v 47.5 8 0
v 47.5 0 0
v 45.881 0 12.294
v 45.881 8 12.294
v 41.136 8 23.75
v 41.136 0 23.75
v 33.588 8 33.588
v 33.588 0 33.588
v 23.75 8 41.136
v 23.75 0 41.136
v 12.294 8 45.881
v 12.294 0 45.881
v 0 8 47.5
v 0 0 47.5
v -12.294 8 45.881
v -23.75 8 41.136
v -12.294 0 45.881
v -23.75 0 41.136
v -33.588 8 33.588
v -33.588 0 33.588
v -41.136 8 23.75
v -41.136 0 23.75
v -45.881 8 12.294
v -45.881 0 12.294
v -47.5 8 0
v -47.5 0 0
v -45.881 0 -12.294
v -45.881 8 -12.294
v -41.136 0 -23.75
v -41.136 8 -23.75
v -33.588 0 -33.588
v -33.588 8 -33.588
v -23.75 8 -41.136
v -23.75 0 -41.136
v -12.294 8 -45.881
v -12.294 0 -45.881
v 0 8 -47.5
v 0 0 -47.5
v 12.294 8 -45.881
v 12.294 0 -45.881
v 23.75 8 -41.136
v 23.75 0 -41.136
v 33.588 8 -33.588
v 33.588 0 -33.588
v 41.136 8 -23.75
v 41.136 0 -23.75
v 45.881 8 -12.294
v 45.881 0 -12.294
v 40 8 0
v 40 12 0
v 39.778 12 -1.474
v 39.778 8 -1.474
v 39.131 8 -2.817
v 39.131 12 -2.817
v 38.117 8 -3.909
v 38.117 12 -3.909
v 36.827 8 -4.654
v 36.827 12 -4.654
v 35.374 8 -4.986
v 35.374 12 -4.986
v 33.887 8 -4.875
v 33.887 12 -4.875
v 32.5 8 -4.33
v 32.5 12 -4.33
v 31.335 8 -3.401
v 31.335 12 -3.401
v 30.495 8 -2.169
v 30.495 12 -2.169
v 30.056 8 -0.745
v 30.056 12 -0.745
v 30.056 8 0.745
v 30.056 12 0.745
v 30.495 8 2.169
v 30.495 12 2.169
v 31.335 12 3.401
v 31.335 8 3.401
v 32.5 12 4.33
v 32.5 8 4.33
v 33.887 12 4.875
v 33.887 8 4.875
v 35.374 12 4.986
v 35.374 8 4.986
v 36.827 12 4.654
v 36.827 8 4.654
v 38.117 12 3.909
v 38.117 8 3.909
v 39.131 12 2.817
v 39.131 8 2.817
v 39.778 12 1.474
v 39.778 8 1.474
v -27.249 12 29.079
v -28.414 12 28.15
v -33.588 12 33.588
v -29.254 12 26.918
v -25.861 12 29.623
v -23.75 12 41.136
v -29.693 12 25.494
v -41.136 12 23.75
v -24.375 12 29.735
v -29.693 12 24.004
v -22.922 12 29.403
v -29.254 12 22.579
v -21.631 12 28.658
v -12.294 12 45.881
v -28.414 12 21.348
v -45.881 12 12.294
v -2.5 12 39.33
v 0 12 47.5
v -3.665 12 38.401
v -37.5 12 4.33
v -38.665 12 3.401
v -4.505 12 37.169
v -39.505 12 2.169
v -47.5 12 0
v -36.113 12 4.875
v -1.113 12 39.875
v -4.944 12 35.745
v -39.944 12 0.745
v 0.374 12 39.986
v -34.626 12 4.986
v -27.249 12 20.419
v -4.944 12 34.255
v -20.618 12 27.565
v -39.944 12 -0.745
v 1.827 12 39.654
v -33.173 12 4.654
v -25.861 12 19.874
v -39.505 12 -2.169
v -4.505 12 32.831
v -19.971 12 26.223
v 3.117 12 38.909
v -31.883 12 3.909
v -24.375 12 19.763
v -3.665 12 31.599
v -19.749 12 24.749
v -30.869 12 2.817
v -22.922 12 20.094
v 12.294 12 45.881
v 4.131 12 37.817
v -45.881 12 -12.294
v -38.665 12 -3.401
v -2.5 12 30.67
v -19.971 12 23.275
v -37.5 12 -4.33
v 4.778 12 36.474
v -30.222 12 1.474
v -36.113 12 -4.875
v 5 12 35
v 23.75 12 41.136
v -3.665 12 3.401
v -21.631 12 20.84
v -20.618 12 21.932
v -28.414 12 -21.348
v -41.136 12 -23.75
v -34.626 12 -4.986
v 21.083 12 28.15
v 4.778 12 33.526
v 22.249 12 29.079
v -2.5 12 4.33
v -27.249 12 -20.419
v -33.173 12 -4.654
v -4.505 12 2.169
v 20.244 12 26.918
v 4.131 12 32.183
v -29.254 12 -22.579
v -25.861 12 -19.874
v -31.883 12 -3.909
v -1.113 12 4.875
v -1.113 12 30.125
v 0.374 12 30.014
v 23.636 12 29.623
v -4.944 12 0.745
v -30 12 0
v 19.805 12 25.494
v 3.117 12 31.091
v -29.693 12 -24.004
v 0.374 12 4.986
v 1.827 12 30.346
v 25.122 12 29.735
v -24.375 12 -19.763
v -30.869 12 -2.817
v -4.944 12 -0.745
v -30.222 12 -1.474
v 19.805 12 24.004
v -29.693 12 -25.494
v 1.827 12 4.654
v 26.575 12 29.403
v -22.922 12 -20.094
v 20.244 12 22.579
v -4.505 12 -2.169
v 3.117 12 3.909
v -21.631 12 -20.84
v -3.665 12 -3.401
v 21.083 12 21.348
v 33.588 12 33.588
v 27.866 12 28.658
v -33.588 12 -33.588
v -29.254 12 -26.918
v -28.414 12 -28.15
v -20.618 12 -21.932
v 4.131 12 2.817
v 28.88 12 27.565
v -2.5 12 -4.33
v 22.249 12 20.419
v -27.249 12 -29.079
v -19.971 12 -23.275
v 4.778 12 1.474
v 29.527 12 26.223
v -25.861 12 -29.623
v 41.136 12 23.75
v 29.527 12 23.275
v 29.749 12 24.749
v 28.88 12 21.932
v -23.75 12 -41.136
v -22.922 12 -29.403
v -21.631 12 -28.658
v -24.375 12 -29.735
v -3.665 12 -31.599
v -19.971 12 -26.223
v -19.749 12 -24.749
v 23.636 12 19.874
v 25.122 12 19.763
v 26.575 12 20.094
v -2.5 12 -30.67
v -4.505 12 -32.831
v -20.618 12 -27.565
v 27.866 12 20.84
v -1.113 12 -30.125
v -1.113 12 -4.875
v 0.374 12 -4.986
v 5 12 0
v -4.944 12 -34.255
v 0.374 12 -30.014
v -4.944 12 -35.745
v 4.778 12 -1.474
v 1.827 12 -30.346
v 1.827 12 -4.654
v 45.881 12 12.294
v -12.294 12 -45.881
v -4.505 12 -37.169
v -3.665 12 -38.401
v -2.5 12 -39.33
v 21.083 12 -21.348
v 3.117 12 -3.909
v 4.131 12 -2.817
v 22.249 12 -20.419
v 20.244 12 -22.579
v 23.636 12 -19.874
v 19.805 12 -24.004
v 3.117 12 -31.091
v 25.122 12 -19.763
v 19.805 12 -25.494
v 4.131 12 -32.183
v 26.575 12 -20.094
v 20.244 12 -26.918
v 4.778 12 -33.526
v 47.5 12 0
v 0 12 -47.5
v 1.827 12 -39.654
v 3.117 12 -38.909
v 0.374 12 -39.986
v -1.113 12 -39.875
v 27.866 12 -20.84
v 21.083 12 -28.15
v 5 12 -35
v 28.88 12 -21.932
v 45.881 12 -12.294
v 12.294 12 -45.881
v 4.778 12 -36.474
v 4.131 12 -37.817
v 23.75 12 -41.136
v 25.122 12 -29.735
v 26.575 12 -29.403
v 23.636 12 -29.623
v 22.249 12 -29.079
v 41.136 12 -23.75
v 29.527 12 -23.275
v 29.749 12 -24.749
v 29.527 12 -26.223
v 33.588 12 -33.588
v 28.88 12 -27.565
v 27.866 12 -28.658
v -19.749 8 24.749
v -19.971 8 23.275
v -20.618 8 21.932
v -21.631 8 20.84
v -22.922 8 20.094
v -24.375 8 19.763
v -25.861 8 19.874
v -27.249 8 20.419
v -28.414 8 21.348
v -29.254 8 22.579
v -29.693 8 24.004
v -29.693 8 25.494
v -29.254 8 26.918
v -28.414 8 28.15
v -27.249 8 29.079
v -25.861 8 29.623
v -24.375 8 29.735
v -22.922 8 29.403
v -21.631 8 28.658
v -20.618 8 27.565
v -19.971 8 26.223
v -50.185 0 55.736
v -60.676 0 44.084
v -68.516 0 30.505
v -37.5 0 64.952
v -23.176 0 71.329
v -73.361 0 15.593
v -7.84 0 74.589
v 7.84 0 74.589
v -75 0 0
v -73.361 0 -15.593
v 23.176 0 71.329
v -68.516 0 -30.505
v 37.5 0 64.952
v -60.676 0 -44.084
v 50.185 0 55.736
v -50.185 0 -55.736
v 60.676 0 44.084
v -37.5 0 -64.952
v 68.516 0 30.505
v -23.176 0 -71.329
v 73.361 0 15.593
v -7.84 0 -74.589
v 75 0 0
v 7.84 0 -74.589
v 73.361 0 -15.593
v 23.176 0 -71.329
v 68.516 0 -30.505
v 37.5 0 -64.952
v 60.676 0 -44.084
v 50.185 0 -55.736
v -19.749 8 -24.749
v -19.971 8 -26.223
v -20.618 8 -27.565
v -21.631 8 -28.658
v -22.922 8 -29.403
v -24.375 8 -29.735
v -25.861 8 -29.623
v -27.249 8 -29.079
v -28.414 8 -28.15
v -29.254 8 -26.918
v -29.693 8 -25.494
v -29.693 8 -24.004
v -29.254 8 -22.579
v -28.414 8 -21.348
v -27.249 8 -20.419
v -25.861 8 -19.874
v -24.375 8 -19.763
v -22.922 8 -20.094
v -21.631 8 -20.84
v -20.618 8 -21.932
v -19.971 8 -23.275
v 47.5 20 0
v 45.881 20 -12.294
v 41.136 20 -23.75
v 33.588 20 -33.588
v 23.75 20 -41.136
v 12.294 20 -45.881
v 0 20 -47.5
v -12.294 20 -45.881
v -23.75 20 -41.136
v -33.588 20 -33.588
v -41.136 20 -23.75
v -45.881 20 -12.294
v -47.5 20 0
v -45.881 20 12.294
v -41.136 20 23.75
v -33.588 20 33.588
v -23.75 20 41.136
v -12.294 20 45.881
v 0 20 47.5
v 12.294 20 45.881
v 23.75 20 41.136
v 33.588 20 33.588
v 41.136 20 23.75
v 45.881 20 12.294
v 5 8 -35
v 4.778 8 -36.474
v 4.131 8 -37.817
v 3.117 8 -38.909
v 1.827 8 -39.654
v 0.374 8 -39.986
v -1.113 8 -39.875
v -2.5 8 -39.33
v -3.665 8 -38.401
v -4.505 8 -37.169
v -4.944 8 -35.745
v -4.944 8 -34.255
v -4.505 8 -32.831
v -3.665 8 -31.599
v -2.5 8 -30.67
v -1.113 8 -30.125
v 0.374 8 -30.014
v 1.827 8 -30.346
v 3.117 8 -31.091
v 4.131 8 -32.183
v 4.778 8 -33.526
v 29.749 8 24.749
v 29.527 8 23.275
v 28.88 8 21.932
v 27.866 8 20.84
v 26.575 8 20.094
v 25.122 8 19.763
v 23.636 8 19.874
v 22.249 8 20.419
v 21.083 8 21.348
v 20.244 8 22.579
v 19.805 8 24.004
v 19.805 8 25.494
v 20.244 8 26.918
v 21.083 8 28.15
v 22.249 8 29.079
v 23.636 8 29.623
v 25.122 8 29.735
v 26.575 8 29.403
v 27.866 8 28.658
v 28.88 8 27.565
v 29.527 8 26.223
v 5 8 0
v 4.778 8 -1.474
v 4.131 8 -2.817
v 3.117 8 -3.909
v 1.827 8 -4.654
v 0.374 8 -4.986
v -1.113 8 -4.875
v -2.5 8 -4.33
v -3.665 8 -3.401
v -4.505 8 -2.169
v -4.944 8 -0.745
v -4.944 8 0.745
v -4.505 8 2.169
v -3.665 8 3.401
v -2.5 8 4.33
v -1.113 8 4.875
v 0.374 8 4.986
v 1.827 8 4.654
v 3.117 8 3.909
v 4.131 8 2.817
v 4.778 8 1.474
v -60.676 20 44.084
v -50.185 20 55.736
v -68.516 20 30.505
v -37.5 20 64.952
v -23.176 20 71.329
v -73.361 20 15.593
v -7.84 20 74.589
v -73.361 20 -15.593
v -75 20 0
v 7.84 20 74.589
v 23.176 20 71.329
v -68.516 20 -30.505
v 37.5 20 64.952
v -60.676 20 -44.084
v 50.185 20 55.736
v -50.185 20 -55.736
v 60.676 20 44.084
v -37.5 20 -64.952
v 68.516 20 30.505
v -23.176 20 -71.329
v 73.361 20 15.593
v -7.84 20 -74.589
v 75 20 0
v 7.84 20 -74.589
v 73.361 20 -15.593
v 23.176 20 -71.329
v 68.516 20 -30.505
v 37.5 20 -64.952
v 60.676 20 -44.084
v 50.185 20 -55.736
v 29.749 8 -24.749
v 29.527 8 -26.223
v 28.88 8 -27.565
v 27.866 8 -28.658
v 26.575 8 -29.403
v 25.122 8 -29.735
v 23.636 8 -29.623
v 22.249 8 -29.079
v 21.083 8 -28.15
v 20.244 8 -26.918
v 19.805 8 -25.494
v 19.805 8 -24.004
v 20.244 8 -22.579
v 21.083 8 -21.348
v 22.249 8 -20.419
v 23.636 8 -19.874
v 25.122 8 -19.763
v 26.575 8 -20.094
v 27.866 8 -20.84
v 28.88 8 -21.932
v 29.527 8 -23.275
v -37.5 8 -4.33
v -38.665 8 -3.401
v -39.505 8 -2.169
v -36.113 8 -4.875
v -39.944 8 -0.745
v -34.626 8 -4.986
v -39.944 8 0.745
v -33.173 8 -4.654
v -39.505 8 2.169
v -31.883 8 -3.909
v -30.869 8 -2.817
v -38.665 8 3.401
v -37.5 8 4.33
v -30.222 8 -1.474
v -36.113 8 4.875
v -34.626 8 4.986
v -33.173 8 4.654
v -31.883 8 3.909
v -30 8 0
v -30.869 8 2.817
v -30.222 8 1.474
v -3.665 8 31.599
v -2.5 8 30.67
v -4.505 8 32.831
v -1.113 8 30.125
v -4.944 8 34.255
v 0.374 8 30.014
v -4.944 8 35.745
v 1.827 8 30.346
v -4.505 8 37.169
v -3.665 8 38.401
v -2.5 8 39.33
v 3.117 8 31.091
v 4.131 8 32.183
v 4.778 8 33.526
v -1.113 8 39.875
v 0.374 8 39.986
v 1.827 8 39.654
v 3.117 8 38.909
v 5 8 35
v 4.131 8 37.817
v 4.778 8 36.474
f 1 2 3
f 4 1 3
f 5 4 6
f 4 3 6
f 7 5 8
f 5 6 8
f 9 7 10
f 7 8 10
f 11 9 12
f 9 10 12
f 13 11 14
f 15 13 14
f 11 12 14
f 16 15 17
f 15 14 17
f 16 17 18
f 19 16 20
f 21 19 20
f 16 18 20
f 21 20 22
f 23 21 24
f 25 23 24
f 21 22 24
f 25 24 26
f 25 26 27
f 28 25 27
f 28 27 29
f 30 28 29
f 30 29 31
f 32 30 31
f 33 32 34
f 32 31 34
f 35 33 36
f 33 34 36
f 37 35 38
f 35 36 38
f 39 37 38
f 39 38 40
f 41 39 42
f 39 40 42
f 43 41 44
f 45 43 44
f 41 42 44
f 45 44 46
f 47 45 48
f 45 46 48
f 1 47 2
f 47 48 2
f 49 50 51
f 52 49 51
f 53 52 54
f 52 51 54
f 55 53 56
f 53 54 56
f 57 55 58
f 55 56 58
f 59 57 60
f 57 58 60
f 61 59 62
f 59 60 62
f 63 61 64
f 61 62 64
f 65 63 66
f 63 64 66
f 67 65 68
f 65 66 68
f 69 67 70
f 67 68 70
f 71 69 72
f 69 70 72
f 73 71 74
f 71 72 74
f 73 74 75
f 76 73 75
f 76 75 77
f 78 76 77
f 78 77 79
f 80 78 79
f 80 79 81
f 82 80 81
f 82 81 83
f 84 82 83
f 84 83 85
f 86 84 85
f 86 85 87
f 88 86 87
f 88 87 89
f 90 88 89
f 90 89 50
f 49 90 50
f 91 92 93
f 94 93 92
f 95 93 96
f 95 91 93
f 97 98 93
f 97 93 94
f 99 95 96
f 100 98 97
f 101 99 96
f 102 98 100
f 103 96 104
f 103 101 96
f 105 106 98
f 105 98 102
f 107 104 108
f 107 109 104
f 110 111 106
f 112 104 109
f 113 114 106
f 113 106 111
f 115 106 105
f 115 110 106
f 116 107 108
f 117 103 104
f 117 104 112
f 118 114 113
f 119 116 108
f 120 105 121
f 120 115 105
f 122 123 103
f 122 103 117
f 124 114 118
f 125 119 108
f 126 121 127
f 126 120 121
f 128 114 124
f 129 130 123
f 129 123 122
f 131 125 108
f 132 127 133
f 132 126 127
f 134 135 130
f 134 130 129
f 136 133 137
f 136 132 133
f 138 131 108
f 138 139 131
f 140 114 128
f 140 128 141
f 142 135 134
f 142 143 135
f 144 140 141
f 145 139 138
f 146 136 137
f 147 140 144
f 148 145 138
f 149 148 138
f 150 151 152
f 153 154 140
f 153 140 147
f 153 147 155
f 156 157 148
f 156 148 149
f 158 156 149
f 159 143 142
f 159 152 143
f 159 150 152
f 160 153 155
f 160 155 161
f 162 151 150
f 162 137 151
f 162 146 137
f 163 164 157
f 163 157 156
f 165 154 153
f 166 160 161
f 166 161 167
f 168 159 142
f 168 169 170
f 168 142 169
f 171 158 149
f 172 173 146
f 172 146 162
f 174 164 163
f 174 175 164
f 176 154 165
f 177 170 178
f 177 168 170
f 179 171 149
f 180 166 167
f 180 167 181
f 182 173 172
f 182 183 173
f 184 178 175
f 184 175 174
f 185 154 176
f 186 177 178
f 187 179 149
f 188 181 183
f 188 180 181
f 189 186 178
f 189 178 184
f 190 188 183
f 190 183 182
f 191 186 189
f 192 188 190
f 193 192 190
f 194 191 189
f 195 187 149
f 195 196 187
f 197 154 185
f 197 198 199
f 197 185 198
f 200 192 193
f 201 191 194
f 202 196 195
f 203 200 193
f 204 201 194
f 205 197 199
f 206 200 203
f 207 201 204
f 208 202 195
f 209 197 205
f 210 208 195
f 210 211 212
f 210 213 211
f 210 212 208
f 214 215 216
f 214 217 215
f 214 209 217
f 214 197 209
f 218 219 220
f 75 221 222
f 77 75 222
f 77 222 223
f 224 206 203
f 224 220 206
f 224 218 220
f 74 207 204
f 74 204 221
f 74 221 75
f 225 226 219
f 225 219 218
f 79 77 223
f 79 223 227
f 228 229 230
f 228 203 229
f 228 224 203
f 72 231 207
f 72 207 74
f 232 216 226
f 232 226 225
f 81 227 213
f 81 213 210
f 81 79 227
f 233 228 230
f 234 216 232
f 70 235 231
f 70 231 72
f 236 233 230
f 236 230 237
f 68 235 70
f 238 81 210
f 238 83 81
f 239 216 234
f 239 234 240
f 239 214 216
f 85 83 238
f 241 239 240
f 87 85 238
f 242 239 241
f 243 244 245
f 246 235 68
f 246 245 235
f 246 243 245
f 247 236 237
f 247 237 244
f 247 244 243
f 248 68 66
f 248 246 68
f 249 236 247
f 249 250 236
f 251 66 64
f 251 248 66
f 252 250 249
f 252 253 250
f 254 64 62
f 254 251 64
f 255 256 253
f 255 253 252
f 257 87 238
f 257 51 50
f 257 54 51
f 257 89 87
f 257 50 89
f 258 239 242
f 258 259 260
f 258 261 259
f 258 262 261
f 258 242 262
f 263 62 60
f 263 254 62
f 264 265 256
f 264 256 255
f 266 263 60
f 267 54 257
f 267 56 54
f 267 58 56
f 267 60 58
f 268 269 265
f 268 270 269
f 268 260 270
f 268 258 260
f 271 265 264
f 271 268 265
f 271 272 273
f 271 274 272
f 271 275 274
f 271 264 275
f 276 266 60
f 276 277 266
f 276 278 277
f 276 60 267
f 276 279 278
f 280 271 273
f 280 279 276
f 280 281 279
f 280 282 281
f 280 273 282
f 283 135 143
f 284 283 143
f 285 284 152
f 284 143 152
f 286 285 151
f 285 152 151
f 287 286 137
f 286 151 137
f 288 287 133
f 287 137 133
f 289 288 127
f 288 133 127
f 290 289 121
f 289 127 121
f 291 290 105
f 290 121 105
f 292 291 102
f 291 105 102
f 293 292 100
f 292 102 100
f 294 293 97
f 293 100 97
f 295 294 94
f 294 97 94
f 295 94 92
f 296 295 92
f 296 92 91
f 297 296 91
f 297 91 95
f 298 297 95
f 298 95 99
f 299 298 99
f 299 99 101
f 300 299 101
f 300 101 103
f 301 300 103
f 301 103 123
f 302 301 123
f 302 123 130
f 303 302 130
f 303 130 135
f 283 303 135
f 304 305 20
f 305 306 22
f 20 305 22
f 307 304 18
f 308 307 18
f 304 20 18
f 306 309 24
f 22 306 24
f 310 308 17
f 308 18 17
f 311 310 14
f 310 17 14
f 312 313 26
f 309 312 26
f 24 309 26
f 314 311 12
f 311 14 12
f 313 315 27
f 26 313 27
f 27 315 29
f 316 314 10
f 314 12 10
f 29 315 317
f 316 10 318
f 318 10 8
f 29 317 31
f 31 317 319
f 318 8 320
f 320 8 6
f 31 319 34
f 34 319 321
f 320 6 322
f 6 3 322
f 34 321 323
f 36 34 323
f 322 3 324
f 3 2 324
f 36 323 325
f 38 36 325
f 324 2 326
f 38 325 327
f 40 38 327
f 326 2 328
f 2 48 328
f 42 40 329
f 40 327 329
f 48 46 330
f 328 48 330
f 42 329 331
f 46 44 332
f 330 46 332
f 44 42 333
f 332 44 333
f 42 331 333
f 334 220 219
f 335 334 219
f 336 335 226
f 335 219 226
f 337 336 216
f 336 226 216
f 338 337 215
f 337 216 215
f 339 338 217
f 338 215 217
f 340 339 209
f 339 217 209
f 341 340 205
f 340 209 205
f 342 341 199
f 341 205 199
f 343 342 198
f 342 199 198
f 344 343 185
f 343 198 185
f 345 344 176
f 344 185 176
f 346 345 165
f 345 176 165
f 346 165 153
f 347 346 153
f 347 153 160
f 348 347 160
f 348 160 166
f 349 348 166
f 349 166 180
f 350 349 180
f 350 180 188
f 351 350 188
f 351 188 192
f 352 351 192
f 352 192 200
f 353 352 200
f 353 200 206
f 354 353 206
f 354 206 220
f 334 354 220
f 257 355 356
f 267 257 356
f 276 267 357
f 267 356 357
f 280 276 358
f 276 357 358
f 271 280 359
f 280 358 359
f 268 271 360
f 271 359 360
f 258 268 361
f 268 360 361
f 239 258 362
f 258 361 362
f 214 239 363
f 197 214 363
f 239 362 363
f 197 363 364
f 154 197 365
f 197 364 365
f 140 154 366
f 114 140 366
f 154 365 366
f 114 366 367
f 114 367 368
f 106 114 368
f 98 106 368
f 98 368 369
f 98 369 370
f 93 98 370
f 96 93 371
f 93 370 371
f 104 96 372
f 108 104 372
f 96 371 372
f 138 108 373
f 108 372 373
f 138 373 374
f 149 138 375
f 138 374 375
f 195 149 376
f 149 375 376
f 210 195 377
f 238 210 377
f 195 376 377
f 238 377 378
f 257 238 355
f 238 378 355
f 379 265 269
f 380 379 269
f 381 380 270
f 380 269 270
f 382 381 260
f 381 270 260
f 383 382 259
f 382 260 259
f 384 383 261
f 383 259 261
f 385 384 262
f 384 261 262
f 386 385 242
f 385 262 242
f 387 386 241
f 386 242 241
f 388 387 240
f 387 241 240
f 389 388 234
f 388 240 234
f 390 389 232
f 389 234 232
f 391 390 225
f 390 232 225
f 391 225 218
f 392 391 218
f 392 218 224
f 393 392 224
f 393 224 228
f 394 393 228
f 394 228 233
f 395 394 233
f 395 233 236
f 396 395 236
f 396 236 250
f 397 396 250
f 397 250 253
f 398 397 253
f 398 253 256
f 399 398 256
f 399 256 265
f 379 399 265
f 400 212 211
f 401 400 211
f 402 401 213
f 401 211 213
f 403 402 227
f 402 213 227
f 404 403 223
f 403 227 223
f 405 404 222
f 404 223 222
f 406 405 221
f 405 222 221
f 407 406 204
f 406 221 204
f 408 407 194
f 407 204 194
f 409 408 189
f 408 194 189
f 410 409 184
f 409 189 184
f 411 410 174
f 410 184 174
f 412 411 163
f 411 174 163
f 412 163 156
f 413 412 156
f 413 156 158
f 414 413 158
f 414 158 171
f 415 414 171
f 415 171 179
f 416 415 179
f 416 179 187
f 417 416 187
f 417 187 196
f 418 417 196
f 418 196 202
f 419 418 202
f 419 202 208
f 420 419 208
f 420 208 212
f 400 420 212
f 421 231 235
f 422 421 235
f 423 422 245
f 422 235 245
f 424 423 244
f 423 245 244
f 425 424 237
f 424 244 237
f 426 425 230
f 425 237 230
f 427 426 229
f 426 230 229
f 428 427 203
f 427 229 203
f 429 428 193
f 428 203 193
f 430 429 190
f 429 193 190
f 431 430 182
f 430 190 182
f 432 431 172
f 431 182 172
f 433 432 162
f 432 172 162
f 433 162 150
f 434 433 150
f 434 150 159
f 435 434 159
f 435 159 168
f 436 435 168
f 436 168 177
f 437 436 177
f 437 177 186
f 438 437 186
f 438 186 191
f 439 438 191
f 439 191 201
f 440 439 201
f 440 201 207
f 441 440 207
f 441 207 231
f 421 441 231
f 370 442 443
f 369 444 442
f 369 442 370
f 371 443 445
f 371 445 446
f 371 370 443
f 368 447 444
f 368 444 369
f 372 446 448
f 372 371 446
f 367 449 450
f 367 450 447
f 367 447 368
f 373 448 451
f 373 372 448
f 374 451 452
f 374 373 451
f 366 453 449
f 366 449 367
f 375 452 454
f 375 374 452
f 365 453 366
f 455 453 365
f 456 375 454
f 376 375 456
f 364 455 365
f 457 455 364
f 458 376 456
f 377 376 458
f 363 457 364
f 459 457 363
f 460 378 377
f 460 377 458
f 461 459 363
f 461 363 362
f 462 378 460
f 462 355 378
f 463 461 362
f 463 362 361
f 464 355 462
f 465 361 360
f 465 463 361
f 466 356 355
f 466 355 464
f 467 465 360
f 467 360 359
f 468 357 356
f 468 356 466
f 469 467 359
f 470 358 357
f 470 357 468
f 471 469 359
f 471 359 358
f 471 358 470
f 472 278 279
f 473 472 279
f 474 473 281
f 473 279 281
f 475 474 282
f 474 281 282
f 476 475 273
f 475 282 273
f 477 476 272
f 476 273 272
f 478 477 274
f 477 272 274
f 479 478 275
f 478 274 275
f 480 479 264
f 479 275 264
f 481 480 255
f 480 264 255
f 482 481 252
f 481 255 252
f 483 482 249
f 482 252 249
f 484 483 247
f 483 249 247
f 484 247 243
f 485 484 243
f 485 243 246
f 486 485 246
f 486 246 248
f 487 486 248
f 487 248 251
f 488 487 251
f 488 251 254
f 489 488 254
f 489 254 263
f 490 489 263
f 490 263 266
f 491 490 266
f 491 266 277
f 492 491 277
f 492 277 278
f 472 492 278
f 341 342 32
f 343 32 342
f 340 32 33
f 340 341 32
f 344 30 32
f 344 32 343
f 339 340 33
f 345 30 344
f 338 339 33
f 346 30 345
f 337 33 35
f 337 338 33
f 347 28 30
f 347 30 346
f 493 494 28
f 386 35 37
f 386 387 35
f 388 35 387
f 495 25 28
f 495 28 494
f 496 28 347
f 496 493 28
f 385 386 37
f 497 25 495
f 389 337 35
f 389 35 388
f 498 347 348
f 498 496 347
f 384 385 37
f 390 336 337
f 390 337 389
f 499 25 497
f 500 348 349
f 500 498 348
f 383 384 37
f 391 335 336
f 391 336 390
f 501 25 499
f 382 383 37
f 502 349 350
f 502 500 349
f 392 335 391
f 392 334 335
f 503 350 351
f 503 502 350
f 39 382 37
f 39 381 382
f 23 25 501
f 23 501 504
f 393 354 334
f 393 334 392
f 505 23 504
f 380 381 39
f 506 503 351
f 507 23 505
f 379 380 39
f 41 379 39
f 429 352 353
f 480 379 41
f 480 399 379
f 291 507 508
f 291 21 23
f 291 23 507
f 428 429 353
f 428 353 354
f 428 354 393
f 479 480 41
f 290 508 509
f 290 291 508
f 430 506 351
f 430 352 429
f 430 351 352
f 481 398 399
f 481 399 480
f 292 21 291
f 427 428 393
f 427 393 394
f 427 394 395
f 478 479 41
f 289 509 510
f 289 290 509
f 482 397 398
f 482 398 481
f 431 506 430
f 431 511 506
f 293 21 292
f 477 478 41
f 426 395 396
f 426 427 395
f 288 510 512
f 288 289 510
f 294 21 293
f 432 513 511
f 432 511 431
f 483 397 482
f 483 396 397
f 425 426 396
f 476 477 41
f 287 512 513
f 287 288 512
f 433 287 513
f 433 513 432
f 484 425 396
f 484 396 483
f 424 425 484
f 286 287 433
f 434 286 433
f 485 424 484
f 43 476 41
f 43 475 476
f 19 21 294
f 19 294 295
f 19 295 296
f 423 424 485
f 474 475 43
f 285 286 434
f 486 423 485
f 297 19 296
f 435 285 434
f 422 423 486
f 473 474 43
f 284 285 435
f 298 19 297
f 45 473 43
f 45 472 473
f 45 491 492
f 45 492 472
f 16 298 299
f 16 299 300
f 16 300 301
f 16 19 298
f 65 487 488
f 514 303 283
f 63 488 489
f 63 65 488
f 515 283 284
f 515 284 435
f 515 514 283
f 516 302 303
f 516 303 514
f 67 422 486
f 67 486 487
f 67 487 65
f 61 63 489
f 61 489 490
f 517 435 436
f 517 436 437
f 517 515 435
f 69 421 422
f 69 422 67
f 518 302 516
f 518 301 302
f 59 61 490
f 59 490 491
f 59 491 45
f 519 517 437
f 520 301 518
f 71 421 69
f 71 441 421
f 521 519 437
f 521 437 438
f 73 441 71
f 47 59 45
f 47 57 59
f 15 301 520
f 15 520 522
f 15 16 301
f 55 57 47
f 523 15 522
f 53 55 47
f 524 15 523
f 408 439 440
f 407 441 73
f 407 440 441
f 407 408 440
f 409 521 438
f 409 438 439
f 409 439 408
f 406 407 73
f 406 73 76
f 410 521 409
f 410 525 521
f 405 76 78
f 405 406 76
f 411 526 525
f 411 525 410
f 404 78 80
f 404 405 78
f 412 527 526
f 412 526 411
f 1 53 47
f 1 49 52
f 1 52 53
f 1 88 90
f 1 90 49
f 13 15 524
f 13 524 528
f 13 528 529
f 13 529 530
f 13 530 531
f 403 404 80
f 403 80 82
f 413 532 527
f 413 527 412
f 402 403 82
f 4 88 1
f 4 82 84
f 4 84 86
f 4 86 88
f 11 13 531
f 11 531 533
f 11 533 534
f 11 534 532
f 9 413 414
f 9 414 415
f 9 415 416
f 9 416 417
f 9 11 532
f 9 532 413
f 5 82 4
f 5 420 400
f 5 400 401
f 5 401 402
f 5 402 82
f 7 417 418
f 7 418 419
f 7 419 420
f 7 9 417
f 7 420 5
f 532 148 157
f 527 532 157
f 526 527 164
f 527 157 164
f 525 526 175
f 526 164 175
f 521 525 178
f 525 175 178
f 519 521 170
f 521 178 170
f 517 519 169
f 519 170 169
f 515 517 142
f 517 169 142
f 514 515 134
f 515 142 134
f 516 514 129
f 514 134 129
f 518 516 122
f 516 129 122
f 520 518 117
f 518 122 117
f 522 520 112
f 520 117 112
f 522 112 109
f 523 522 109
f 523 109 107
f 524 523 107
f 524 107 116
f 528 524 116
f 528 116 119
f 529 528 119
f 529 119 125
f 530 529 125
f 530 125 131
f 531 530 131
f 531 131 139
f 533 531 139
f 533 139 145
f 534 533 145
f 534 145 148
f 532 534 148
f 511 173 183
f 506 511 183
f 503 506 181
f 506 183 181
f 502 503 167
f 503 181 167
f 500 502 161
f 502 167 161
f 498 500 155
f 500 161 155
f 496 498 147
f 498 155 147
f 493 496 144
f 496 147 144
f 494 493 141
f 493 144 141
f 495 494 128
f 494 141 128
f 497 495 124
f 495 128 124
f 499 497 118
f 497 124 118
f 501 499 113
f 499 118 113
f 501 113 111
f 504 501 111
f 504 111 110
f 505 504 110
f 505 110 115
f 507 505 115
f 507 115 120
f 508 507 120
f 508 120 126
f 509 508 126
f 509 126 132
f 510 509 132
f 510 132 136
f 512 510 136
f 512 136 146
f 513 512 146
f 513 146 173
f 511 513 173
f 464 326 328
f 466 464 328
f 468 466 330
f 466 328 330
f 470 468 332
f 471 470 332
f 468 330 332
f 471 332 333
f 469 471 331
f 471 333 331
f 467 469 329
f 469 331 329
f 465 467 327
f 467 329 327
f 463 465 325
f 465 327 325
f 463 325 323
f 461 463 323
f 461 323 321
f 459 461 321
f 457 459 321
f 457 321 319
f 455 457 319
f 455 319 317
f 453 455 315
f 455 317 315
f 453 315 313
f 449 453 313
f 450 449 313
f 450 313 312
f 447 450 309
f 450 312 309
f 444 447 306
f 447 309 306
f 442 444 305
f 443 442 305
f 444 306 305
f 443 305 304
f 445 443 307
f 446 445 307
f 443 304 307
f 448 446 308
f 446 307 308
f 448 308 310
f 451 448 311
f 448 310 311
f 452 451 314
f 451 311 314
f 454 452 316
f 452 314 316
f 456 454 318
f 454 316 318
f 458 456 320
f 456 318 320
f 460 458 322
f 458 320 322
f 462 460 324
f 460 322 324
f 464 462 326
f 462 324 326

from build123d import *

# Parameters (mm, degrees)
SKETCH1_R           = 75
SKETCH1_R_2         = 43
BOSS_EXTRUDE1_DEPTH = 20
SKETCH2_R           = 43
BOSS_EXTRUDE2_DEPTH = 20
SKETCH3_R           = 47.5
CUT_EXTRUDE1_DEPTH  = 8
SKETCH6_R           = 5
CUT_EXTRUDE4_DEPTH  = 13
SKETCH4_R           = 47.5
CUT_EXTRUDE2_DEPTH  = 8
SKETCH5_R           = 3
SKETCH5_R_2         = 5
CUT_EXTRUDE3_DEPTH  = 13


with BuildPart() as part:
    # Sketch1 → Boss-Extrude1 (new body)
    with BuildSketch(Plane(origin=(0, 0, 0), x_dir=(1, 0, 0), z_dir=(0, 1, 0))):
        Circle(SKETCH1_R)
        Circle(SKETCH1_R_2, mode=Mode.SUBTRACT)
    extrude(amount=BOSS_EXTRUDE1_DEPTH)

    # Sketch2 → Boss-Extrude2 (add)
    with BuildSketch(Plane(origin=(0, 20, 0), x_dir=(1, 0, 0), z_dir=(0, 1, 0))):
        Circle(SKETCH2_R)
    extrude(amount=-BOSS_EXTRUDE2_DEPTH)

    # Sketch3 → Cut-Extrude1 (cut)
    with BuildSketch(Plane(origin=(0, 20, 0), x_dir=(1, 0, 0), z_dir=(0, 1, 0))):
        Circle(SKETCH3_R)
    extrude(amount=-CUT_EXTRUDE1_DEPTH, mode=Mode.SUBTRACT)

    # Sketch6 → Cut-Extrude4 (cut, through all)
    with BuildSketch(Plane(origin=(0, 12, 0), x_dir=(1, 0, 0), z_dir=(0, 1, 0))):
        Circle(SKETCH6_R)
    extrude(amount=-CUT_EXTRUDE4_DEPTH, mode=Mode.SUBTRACT)

    # Sketch4 → Cut-Extrude2 (cut)
    with BuildSketch(Plane.XZ):
        Circle(SKETCH4_R)
    extrude(amount=-CUT_EXTRUDE2_DEPTH, mode=Mode.SUBTRACT)

    # Sketch5 → Cut-Extrude3 (cut, through all)
    with BuildSketch(Plane(origin=(0, 12, 0), x_dir=(1, 0, 0), z_dir=(0, 1, 0))):
        Circle(SKETCH5_R)
        with Locations((0, 35)):
            Circle(SKETCH5_R_2)
        with Locations((24.748737342, 24.748737342)):
            Circle(SKETCH5_R_2)
        with Locations((35, 0)):
            Circle(SKETCH5_R_2)
        with Locations((24.748737342, -24.748737342)):
            Circle(SKETCH5_R_2)
        with Locations((0, -35)):
            Circle(SKETCH5_R_2)
        with Locations((-24.748737342, -24.748737342)):
            Circle(SKETCH5_R_2)
        with Locations((-35, 0)):
            Circle(SKETCH5_R_2)
        with Locations((-24.748737342, 24.748737342)):
            Circle(SKETCH5_R_2)
    extrude(amount=-CUT_EXTRUDE3_DEPTH, mode=Mode.SUBTRACT)


solid = part.part
